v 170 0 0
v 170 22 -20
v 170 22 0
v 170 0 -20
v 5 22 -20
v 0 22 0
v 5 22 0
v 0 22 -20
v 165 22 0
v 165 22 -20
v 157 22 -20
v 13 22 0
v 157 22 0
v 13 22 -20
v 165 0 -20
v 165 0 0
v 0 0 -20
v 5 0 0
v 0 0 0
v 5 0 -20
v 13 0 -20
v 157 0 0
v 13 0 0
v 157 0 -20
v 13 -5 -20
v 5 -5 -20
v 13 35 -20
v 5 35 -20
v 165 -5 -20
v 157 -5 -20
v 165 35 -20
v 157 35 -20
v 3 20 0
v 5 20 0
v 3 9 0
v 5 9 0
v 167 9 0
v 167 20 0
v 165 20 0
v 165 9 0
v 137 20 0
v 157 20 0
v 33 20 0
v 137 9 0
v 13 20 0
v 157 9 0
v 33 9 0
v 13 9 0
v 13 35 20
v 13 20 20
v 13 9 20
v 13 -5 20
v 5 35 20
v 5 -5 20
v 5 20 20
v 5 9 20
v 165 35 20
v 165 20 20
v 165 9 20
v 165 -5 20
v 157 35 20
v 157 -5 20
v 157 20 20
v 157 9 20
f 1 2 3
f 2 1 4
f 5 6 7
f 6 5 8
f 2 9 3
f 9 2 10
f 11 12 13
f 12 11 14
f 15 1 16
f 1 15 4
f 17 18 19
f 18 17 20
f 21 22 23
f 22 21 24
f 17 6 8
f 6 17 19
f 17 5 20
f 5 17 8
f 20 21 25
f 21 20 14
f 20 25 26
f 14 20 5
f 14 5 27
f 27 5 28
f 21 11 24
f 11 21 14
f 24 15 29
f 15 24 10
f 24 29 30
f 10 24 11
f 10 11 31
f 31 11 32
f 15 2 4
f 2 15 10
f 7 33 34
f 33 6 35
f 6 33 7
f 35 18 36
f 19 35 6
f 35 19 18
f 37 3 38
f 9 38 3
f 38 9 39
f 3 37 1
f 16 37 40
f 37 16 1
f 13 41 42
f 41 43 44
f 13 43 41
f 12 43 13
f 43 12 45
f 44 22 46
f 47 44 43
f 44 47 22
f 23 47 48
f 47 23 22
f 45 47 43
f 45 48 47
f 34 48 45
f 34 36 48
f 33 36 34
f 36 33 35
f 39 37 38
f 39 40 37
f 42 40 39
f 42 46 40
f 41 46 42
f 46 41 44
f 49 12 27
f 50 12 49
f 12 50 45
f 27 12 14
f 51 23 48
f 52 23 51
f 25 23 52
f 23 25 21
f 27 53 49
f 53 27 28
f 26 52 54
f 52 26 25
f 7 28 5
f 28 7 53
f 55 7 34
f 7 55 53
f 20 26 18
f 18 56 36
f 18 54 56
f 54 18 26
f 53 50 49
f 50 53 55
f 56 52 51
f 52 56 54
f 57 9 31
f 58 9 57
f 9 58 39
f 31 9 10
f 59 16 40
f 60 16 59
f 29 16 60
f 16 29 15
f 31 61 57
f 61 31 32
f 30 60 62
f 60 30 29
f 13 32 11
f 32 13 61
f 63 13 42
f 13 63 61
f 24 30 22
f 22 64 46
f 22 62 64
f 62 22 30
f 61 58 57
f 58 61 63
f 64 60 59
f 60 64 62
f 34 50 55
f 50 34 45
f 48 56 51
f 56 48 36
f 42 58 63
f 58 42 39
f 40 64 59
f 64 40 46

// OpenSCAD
$fn=20;
rotate([90,180,180])difference(){
difference(){
union(){
cube([170,20,22]);
translate([5,-20,-5])cube([8,40,40]);

translate([157,-20,-5])cube([8,40,40]);
}

translate([3,-20,9])cube([30,20,11]);

}
translate([137,-20,9])cube([30,20,11]);
}





/*
difference(){
difference(){
difference(){
union(){
cube([170,20,20]);



}
translate([0,0,5])cube([340,10,10]);
}
translate([10, 9,-10]) cylinder(40,3,3, $fn=100);}
translate([160, 9,-10]) cylinder(40,3,3, $fn=100);}

*/
